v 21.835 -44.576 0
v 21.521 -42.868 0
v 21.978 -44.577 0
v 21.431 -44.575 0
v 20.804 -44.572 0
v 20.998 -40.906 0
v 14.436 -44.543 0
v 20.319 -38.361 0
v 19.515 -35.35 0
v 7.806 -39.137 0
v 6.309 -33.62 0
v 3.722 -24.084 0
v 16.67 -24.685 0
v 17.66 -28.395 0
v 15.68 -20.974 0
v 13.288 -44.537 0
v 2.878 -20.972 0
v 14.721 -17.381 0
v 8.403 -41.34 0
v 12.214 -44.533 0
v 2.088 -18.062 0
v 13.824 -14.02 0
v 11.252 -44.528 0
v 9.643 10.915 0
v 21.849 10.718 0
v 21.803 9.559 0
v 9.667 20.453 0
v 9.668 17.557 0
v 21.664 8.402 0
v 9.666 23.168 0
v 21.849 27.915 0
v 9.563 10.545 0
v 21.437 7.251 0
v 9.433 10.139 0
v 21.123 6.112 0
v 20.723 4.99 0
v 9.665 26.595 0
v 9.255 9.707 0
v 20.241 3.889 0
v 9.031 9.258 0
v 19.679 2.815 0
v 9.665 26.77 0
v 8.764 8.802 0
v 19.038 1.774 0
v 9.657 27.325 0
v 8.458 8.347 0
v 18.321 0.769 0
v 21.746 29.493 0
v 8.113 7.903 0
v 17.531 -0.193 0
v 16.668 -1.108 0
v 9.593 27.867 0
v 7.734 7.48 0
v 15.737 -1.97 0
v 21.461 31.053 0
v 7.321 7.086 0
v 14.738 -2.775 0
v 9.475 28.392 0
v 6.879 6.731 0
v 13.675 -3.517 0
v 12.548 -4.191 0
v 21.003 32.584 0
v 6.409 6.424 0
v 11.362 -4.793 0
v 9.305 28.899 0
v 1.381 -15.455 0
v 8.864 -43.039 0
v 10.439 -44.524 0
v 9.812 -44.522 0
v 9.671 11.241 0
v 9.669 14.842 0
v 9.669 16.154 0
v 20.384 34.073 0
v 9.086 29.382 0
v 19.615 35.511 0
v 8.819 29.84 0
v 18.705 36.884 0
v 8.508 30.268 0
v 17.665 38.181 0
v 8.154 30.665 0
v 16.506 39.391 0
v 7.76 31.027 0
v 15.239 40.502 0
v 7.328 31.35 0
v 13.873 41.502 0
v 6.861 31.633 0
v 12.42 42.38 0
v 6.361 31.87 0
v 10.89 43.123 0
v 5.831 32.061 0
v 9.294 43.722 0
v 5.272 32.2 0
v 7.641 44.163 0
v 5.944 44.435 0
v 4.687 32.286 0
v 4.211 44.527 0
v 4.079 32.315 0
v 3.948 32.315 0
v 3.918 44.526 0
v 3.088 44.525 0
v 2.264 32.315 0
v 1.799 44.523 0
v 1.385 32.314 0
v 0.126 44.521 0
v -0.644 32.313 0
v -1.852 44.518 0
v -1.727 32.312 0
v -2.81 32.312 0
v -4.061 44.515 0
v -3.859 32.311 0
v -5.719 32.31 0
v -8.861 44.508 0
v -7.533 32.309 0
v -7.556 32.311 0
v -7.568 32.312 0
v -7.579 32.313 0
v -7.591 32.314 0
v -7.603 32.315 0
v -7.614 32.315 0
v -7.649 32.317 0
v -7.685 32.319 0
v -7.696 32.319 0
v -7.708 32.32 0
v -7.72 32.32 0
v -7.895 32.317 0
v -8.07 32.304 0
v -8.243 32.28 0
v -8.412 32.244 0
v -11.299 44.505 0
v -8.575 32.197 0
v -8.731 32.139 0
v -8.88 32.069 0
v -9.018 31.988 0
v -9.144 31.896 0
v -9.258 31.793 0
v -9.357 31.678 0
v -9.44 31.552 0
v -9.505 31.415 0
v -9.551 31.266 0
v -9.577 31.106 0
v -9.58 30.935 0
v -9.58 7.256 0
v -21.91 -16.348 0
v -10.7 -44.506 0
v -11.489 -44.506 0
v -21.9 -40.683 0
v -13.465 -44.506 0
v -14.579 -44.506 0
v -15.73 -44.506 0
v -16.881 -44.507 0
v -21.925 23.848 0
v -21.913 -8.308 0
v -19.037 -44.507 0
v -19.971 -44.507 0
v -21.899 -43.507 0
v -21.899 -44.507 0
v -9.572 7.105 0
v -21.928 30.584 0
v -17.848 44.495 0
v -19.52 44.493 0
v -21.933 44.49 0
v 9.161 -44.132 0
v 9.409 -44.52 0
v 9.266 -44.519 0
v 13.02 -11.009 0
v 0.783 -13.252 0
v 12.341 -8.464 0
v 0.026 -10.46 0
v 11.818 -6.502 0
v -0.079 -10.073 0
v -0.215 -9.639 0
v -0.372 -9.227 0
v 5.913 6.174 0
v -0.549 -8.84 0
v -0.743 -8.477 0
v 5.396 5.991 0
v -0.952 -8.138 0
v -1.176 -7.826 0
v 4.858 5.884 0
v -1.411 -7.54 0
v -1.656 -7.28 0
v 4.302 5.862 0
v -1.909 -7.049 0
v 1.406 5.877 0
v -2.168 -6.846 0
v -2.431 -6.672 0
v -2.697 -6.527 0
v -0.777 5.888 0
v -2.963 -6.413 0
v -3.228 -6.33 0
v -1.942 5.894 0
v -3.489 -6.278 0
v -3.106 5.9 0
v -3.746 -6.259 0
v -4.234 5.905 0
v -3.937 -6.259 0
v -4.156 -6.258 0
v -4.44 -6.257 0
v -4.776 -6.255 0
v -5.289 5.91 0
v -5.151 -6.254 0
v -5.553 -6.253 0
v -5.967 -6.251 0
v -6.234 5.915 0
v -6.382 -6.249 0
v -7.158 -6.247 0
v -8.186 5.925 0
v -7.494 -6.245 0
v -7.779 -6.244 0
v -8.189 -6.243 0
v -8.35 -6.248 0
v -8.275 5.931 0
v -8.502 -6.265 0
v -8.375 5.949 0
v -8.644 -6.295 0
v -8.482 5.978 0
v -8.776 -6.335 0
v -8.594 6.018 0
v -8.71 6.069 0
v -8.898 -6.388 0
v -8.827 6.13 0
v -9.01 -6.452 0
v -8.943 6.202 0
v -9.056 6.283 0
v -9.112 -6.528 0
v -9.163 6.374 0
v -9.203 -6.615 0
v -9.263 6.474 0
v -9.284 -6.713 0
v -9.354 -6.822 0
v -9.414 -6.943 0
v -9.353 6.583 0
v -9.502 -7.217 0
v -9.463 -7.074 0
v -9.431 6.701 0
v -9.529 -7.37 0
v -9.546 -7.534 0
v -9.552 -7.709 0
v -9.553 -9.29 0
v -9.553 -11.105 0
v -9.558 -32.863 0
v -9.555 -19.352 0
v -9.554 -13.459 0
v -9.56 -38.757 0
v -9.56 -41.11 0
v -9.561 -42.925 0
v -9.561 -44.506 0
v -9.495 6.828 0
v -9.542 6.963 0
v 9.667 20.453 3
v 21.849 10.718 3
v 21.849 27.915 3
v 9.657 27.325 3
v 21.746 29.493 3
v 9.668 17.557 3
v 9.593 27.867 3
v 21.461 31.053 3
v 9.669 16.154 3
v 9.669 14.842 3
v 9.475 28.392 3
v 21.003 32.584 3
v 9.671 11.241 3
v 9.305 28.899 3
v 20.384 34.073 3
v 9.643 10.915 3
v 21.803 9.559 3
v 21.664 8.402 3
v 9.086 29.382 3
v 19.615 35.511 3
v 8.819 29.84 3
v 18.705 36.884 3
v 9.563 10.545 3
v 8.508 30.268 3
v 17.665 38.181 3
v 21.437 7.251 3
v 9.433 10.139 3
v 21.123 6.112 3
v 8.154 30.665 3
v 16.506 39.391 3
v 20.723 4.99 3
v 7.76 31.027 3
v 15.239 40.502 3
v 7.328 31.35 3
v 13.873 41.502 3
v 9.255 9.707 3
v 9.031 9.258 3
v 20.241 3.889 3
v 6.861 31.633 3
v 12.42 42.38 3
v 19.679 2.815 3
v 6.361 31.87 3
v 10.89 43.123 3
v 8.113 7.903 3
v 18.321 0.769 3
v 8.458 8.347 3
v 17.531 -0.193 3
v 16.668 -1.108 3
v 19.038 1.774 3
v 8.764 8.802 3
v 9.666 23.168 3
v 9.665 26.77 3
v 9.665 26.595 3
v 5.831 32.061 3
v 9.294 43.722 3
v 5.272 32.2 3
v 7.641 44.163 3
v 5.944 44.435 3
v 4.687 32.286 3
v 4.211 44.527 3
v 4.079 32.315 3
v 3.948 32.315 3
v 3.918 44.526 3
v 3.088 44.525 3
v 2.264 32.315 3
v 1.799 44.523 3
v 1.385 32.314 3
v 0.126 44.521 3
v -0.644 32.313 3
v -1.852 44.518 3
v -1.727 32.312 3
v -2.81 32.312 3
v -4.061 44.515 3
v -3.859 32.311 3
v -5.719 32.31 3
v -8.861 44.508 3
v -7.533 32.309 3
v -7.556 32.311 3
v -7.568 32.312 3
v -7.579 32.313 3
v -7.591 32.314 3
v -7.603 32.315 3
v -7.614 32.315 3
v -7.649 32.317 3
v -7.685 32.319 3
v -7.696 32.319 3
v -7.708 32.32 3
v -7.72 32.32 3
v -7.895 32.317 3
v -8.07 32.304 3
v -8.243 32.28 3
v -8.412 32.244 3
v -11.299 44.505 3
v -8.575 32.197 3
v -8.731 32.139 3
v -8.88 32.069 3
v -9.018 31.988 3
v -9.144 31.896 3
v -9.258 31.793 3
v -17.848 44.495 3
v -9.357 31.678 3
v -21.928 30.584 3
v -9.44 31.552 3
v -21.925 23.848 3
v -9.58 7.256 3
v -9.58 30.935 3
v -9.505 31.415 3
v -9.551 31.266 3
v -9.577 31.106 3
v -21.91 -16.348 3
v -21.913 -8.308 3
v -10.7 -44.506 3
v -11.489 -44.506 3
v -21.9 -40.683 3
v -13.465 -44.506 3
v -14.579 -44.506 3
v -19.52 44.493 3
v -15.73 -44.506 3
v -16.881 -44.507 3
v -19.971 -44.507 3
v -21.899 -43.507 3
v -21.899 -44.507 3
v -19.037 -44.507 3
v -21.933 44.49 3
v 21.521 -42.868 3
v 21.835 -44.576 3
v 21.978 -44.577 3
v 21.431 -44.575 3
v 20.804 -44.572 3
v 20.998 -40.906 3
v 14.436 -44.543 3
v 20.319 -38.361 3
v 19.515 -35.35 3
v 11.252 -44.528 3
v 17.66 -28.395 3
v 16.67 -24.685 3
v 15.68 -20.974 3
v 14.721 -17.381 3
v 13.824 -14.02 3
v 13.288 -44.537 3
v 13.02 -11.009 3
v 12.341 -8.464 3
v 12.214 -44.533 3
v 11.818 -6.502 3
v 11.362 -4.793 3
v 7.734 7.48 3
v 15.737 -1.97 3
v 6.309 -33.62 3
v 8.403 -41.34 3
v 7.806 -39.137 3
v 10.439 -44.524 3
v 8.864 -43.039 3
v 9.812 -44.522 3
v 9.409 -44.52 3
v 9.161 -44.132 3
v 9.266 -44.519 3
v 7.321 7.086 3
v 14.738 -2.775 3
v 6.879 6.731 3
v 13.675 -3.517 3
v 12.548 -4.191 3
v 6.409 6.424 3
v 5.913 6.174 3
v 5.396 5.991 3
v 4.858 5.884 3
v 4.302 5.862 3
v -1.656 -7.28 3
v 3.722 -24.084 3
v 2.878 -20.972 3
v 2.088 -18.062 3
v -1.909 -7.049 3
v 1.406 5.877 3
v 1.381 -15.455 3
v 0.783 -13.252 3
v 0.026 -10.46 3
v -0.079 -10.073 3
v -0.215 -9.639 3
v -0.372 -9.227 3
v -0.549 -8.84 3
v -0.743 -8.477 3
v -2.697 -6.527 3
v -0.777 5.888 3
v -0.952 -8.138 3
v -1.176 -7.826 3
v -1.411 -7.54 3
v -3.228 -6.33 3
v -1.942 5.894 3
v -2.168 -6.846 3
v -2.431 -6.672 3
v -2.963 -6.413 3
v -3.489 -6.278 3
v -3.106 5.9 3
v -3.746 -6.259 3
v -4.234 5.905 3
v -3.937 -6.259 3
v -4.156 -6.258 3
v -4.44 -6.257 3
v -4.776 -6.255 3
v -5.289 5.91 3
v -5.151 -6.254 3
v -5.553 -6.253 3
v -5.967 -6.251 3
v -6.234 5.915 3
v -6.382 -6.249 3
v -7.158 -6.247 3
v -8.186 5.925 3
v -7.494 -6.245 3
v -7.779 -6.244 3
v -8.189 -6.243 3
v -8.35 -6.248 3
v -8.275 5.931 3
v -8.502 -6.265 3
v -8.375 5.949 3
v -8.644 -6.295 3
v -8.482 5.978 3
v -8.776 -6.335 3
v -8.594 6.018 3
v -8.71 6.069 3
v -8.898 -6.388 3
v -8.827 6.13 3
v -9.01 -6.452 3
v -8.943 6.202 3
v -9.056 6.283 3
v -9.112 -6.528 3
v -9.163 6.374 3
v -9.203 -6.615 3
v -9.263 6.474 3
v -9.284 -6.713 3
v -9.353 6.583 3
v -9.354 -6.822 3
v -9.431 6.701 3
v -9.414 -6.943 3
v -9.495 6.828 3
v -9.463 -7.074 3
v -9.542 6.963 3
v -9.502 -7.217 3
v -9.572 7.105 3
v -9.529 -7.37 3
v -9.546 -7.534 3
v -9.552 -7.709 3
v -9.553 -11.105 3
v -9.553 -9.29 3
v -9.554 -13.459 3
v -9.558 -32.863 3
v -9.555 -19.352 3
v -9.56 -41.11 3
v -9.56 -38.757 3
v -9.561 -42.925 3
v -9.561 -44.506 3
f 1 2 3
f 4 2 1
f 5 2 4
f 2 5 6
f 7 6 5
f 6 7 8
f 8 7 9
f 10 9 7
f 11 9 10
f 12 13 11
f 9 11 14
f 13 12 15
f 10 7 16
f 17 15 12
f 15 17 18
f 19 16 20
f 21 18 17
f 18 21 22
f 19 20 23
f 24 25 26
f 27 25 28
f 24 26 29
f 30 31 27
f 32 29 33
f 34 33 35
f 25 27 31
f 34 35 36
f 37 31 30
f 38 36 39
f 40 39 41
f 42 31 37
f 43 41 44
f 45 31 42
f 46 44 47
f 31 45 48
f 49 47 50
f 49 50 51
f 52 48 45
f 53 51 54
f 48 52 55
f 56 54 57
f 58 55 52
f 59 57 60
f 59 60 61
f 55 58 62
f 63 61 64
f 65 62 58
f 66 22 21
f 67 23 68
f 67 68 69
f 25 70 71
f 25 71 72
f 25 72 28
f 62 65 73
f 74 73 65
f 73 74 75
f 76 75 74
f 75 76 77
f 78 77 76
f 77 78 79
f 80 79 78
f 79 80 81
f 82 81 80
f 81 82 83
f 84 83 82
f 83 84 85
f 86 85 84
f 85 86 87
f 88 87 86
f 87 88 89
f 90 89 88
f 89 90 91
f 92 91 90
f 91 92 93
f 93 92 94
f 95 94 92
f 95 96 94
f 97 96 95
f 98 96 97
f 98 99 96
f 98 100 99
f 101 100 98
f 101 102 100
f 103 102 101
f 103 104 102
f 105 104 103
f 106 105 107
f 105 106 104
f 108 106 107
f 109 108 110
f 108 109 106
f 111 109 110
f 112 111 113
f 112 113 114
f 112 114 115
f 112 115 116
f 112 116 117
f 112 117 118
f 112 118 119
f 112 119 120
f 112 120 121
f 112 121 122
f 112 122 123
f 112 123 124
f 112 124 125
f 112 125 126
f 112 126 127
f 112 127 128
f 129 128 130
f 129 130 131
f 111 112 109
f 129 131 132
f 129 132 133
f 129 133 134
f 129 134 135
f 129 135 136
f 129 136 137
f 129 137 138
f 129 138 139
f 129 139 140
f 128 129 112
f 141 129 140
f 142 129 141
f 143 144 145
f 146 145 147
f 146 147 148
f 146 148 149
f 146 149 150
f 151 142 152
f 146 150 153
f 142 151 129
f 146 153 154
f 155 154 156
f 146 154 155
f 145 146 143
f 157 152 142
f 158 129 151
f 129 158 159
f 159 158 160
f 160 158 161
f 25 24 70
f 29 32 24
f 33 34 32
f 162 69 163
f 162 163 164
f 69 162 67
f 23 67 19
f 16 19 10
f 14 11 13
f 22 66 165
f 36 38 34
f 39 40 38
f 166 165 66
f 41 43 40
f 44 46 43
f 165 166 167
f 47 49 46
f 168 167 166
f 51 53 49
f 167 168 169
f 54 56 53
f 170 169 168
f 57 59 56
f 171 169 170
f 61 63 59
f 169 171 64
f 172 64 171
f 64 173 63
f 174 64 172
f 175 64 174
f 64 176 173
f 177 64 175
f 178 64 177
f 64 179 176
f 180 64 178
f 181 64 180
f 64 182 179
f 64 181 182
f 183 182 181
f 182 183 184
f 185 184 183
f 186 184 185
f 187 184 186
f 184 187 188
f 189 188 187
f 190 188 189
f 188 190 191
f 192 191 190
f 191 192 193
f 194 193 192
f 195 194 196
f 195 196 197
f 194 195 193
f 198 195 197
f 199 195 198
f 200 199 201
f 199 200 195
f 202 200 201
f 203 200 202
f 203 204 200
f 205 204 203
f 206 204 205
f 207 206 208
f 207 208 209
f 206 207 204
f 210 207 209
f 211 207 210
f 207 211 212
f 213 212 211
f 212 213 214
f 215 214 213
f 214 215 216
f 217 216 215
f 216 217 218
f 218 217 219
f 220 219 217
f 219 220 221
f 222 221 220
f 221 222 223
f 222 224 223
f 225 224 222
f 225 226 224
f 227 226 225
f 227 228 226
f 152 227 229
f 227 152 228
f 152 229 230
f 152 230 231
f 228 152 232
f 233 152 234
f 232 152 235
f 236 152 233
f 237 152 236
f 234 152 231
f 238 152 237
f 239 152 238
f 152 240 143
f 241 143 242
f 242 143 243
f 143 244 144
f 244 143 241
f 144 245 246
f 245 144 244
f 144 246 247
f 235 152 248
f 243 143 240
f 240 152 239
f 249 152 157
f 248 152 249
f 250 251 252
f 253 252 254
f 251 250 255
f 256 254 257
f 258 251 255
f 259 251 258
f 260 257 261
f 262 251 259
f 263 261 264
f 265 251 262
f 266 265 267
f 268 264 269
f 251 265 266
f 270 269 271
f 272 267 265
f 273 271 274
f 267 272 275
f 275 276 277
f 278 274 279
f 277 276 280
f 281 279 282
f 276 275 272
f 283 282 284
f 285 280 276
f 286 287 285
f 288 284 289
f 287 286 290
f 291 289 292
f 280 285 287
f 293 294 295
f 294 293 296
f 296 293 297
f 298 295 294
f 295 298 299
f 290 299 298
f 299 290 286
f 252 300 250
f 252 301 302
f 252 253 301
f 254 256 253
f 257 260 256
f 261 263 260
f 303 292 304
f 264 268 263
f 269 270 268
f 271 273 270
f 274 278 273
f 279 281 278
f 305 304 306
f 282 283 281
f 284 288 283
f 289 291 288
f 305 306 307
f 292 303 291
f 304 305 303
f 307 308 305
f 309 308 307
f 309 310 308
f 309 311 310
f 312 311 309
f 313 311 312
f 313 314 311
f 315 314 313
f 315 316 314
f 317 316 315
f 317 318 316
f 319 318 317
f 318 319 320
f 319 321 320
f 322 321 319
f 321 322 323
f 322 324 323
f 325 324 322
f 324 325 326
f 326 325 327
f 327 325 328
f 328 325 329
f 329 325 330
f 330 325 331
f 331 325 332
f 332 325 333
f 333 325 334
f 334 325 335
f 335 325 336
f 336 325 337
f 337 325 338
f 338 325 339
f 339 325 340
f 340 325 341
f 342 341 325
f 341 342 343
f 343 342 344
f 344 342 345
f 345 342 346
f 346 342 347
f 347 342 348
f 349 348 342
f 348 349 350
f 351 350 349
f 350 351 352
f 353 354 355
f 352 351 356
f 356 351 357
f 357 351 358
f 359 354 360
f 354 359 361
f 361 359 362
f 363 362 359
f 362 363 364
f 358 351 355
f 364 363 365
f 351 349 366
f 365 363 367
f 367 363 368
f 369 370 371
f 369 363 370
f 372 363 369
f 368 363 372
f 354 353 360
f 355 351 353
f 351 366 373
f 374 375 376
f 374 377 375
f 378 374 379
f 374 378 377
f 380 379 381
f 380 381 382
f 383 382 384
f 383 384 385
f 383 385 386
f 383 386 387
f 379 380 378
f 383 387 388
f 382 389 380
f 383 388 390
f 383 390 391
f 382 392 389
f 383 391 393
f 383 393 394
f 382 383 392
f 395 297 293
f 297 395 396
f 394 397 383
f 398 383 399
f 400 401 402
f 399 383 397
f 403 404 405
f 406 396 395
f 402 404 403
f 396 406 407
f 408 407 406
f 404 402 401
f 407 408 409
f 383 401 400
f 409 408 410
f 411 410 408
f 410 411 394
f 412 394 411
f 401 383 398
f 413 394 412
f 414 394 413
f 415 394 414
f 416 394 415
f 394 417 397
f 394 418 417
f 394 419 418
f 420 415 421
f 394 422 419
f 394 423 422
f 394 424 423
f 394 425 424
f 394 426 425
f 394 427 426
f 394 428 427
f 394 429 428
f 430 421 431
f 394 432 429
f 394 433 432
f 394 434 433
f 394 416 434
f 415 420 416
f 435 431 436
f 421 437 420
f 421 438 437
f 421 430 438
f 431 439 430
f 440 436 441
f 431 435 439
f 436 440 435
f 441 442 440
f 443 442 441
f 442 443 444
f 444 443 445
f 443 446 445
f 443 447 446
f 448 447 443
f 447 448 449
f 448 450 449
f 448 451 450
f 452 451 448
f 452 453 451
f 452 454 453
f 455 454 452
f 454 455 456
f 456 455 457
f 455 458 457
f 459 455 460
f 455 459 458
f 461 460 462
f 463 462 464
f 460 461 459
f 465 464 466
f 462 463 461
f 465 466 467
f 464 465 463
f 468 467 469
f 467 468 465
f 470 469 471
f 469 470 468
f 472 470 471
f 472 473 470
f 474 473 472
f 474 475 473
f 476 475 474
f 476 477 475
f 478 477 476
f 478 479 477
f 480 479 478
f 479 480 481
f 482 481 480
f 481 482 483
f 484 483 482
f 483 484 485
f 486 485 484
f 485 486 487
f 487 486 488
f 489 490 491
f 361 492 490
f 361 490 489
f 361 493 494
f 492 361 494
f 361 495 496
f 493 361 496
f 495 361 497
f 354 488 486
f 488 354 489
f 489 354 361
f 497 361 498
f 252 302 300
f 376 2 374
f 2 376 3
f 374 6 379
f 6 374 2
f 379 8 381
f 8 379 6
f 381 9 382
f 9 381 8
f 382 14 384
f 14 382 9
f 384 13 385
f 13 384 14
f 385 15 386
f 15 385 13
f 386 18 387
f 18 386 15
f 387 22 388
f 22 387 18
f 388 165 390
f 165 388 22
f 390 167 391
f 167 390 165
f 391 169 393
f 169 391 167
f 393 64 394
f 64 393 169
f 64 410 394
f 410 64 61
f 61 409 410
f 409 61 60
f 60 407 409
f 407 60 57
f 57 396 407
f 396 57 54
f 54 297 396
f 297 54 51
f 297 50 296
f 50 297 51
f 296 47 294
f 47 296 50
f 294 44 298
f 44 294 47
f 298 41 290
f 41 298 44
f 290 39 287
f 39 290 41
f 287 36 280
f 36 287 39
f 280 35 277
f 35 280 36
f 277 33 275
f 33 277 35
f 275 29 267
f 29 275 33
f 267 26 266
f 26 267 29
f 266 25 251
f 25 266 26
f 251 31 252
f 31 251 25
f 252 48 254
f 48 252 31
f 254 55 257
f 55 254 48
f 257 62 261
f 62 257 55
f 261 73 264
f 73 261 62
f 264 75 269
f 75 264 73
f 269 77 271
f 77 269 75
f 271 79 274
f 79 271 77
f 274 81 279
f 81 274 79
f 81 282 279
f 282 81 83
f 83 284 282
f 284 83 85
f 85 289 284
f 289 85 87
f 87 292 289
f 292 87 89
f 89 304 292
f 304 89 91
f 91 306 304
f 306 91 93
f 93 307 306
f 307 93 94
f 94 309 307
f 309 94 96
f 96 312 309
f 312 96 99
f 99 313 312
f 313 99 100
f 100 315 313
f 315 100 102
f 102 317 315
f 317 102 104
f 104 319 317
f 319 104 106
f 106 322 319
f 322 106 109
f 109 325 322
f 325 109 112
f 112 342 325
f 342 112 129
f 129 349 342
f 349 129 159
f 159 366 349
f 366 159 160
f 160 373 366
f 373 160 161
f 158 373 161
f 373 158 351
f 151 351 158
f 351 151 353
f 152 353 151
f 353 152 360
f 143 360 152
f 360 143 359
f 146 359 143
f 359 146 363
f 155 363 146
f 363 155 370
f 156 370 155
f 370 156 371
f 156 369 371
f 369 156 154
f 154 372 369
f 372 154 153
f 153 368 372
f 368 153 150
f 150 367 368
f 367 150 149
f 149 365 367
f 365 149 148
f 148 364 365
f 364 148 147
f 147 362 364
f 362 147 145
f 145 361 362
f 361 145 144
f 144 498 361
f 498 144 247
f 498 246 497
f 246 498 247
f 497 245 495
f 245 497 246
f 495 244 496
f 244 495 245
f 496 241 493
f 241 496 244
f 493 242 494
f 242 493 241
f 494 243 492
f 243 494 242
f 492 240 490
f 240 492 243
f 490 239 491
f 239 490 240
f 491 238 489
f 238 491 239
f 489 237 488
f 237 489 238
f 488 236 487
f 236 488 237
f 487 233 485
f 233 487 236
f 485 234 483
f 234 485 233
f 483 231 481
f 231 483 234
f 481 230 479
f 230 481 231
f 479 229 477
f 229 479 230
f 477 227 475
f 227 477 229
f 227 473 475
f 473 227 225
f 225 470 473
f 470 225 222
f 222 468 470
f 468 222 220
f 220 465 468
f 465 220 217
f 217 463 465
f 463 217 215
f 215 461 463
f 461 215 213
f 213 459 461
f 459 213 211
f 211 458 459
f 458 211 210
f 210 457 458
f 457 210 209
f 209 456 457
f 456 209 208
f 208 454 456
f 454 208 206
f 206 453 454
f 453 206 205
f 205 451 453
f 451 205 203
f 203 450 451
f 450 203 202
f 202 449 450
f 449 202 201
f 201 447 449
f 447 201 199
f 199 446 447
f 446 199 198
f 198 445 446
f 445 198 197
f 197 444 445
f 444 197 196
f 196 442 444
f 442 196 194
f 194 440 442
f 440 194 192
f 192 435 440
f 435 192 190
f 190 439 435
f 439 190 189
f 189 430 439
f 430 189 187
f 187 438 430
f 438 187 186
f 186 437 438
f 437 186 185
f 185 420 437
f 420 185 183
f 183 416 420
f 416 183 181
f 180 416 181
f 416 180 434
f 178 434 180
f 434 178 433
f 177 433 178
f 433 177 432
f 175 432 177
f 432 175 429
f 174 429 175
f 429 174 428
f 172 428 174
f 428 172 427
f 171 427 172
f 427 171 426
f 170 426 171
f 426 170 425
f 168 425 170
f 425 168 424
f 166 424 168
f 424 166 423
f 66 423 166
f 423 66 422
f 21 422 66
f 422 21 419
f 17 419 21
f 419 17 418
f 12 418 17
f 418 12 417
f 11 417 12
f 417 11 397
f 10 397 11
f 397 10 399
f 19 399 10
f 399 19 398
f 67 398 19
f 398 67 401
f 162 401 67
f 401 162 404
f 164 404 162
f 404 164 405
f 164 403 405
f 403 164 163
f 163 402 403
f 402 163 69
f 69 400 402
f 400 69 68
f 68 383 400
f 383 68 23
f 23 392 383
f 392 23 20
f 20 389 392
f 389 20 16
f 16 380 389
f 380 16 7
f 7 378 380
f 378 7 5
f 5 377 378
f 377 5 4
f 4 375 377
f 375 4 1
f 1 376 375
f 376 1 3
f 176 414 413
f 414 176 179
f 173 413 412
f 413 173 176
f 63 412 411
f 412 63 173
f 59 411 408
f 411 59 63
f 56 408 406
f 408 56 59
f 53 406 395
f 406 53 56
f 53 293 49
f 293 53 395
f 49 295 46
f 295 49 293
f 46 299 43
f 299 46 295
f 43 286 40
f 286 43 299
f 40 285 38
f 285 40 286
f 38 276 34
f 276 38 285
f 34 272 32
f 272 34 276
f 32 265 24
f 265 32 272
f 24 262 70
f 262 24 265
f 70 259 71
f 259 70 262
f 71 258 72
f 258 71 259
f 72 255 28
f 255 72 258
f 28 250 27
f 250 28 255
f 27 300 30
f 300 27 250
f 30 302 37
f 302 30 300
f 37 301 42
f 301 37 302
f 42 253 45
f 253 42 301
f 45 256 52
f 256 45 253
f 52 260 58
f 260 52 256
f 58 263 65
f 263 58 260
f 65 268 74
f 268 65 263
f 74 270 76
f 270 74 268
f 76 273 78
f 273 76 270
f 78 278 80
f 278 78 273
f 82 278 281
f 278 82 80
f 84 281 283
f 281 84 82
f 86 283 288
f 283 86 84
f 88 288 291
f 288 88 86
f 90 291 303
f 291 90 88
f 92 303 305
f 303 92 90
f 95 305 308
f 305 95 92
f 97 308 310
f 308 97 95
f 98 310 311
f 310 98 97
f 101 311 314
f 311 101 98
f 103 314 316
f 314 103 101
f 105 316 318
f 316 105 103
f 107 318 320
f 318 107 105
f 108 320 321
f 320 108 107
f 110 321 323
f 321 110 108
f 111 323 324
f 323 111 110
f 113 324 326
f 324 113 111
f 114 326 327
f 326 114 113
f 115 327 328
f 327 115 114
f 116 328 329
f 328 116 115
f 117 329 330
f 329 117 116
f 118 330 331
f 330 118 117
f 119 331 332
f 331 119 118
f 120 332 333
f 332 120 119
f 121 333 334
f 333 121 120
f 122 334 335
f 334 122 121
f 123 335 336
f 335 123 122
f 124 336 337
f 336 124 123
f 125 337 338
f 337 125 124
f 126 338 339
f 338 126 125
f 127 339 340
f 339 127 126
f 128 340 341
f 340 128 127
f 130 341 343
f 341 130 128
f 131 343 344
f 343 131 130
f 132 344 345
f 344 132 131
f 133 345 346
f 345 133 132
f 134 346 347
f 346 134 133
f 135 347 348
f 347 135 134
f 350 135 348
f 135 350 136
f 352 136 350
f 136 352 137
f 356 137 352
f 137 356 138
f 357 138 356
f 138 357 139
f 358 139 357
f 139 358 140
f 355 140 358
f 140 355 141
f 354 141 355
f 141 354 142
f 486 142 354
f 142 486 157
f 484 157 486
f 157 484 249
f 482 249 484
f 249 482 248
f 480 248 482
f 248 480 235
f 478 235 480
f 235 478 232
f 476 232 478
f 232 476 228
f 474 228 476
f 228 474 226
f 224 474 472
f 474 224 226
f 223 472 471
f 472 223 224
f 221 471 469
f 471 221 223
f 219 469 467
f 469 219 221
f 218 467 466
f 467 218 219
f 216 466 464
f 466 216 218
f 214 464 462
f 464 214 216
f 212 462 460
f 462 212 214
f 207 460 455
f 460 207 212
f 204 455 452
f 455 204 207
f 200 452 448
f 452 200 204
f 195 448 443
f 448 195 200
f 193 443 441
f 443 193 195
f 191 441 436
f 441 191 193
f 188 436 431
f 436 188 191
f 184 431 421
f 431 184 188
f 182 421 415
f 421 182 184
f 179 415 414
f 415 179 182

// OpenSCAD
// Generated from 交通部公路局（原交通部公路總局）「新式號牌使用之英文字、數字字體」author trace
fudge = 0.1;

module glyph_2012_R(h = 3) {
  difference() {
    linear_extrude(height = h)
      polygon(points = [[4.2113, 44.5266], [3.9177, 44.5262], [3.088, 44.525], [1.7986, 44.5232], [0.1263, 44.5208], [-1.8524, 44.5181], [-4.0609, 44.5149], [-6.4225, 44.5116], [-8.8608, 44.5082], [-11.2991, 44.5047], [-13.6607, 44.5014], [-15.8692, 44.4983], [-17.8479, 44.4955], [-19.5202, 44.4931], [-20.8096, 44.4913], [-21.6393, 44.4901], [-21.933, 44.4897], [-21.9326, 43.4902], [-21.9315, 40.6656], [-21.9298, 36.2767], [-21.9276, 30.584], [-21.9251, 23.8484], [-21.9222, 16.3307], [-21.9191, 8.2915], [-21.9159, -0.0085], [-21.9127, -8.3085], [-21.9097, -16.3477], [-21.9068, -23.8655], [-21.9042, -30.601], [-21.902, -36.2937], [-21.9003, -40.6827], [-21.8993, -43.5073], [-21.8989, -44.5067], [-21.7603, -44.5067], [-21.3687, -44.5067], [-20.7603, -44.5067], [-19.9711, -44.5067], [-19.0374, -44.5066], [-17.9952, -44.5066], [-16.8807, -44.5066], [-15.7301, -44.5065], [-14.5794, -44.5065], [-13.465, -44.5064], [-12.4228, -44.5064], [-11.489, -44.5064], [-10.6998, -44.5063], [-10.0914, -44.5063], [-9.6998, -44.5063], [-9.5613, -44.5063], [-9.5612, -44.0931], [-9.5609, -42.9252], [-9.5604, -41.1105], [-9.5599, -38.7567], [-9.5592, -35.9718], [-9.5584, -32.8634], [-9.5576, -29.5395], [-9.5568, -26.1077], [-9.556, -22.6759], [-9.5552, -19.3519], [-9.5544, -16.2436], [-9.5537, -13.4586], [-9.5532, -11.1049], [-9.5527, -9.2902], [-9.5525, -8.1223], [-9.5524, -7.709], [-9.5464, -7.5343], [-9.5295, -7.3702], [-9.5017, -7.2169], [-9.4632, -7.0744], [-9.414, -6.9428], [-9.3542, -6.8223], [-9.2838, -6.7128], [-9.203, -6.6146], [-9.1118, -6.5276], [-9.0102, -6.4521], [-8.8985, -6.388], [-8.7765, -6.3355], [-8.6445, -6.2946], [-8.5025, -6.2655], [-8.3505, -6.2482], [-8.1887, -6.2428], [-8.1388, -6.243], [-7.9978, -6.2435], [-7.7787, -6.2443], [-7.4945, -6.2453], [-7.1582, -6.2466], [-6.7829, -6.248], [-6.3816, -6.2495], [-5.9672, -6.251], [-5.5528, -6.2526], [-5.1515, -6.254], [-4.7762, -6.2554], [-4.4399, -6.2567], [-4.1558, -6.2577], [-3.9366, -6.2586], [-3.7956, -6.2591], [-3.7457, -6.2593], [-3.4894, -6.2784], [-3.2278, -6.3299], [-2.963, -6.413], [-2.6968, -6.5272], [-2.4311, -6.6717], [-2.1677, -6.8458], [-1.9086, -7.049], [-1.6557, -7.2805], [-1.4107, -7.5397], [-1.1757, -7.8259], [-0.9524, -8.1384], [-0.7428, -8.4766], [-0.5488, -8.8398], [-0.3722, -9.2274], [-0.2149, -9.6387], [-0.0788, -10.0729], [0.0261, -10.4598], [0.3227, -11.5531], [0.7835, -13.2518], [1.3813, -15.4552], [2.0885, -18.0622], [2.8779, -20.972], [3.722, -24.0836], [4.5935, -27.2961], [5.465, -30.5086], [6.3091, -33.6202], [7.0985, -36.5299], [7.8058, -39.137], [8.4035, -41.3403], [8.8643, -43.0391], [9.1609, -44.1323], [9.2659, -44.5192], [9.4086, -44.5198], [9.8121, -44.5217], [10.439, -44.5245], [11.2521, -44.5283], [12.2141, -44.5326], [13.2879, -44.5375], [14.4362, -44.5428], [15.6217, -44.5482], [16.8073, -44.5536], [17.9555, -44.5588], [19.0293, -44.5637], [19.9914, -44.5681], [20.8045, -44.5718], [21.4314, -44.5747], [21.8349, -44.5765], [21.9776, -44.5772], [21.8584, -44.1304], [21.5215, -42.8677], [20.9979, -40.9057], [20.3189, -38.3608], [19.5154, -35.3498], [18.6187, -31.9891], [17.6598, -28.3953], [16.6697, -24.6849], [15.6797, -20.9745], [14.7207, -17.3807], [13.824, -14.02], [13.0205, -11.009], [12.3415, -8.4641], [11.8179, -6.5021], [11.481, -5.2394], [11.3618, -4.7926], [12.5485, -4.1913], [13.6748, -3.517], [14.7383, -2.7749], [15.7369, -1.9702], [16.6684, -1.1078], [17.5306, -0.1929], [18.3211, 0.7693], [19.0379, 1.7738], [19.6786, 2.8154], [20.2412, 3.8891], [20.7232, 4.9897], [21.1226, 6.1122], [21.4371, 7.2513], [21.6645, 8.4021], [21.8026, 9.5593], [21.8491, 10.718], [21.8491, 10.9111], [21.8491, 11.4569], [21.8491, 12.3051], [21.8491, 13.4051], [21.8491, 14.7067], [21.8491, 16.1594], [21.8491, 17.7129], [21.8491, 19.3168], [21.8491, 20.9206], [21.8491, 22.4741], [21.8491, 23.9268], [21.8491, 25.2284], [21.8491, 26.3284], [21.8491, 27.1766], [21.8491, 27.7224], [21.8491, 27.9155], [21.7462, 29.4931], [21.4607, 31.0531], [21.0033, 32.5837], [20.3845, 34.0735], [19.6149, 35.5108], [18.7049, 36.8839], [17.6652, 38.1812], [16.5064, 39.391], [15.2389, 40.5018], [13.8733, 41.5019], [12.4202, 42.3797], [10.8902, 43.1235], [9.2937, 43.7218], [7.6414, 44.1628], [5.9437, 44.4349], [4.2113, 44.5266], [4.2113, 44.5266], [4.2113, 44.5266], [4.2113, 44.5266], [4.2113, 44.5266], [4.2113, 44.5266], [4.2113, 44.5266], [4.2113, 44.5266], [4.2113, 44.5266], [4.2113, 44.5266], [4.2113, 44.5266], [4.2113, 44.5266], [4.2113, 44.5266], [4.2113, 44.5266], [4.2113, 44.5266], [4.2113, 44.5266]]);
    translate([0, 0, -fudge])
      linear_extrude(height = h + 2 * fudge)
        polygon(points = [[-7.7198, 32.3199], [-7.7081, 32.3196], [-7.6964, 32.3191], [-7.6847, 32.3187], [-7.673, 32.3182], [-7.6612, 32.3177], [-7.6495, 32.3172], [-7.6378, 32.3166], [-7.6261, 32.316], [-7.6144, 32.3154], [-7.6027, 32.3147], [-7.5911, 32.3139], [-7.5794, 32.3132], [-7.5678, 32.3123], [-7.5561, 32.3115], [-7.5445, 32.3105], [-7.5329, 32.3095], [-7.4025, 32.3096], [-7.034, 32.3098], [-6.4613, 32.3101], [-5.7186, 32.3105], [-4.8398, 32.3109], [-3.8589, 32.3114], [-2.8101, 32.312], [-1.7272, 32.3125], [-0.6442, 32.3131], [0.4046, 32.3136], [1.3855, 32.3141], [2.2643, 32.3146], [3.007, 32.315], [3.5797, 32.3153], [3.9482, 32.3155], [4.0786, 32.3155], [4.687, 32.2865], [5.2719, 32.2005], [5.8308, 32.0608], [6.3614, 31.8705], [6.8614, 31.6327], [7.3283, 31.3505], [7.7599, 31.0269], [8.1538, 30.6652], [8.5076, 30.2684], [8.819, 29.8396], [9.0856, 29.382], [9.3051, 28.8986], [9.4751, 28.3925], [9.5932, 27.867], [9.6572, 27.325], [9.6646, 26.7697], [9.6646, 26.5953], [9.6648, 26.1024], [9.6651, 25.3366], [9.6655, 24.3433], [9.666, 23.168], [9.6665, 21.8562], [9.667, 20.4534], [9.6676, 19.0052], [9.6682, 17.5569], [9.6687, 16.1541], [9.6692, 14.8423], [9.6697, 13.6671], [9.6701, 12.6737], [9.6704, 11.9079], [9.6706, 11.415], [9.6707, 11.2406], [9.6435, 10.9151], [9.5634, 10.5448], [9.4329, 10.1391], [9.2546, 9.7071], [9.0309, 9.2583], [8.7644, 8.8019], [8.4577, 8.3472], [8.1132, 7.9035], [7.7336, 7.48], [7.3212, 7.086], [6.8787, 6.7309], [6.4086, 6.4238], [5.9134, 6.1742], [5.3956, 5.9912], [4.8578, 5.8842], [4.3025, 5.8624], [4.1622, 5.8631], [3.7659, 5.8651], [3.15, 5.8682], [2.3512, 5.8722], [1.406, 5.8769], [0.3511, 5.8822], [-0.777, 5.8879], [-1.9416, 5.8937], [-3.1063, 5.8996], [-4.2344, 5.9052], [-5.2893, 5.9105], [-6.2345, 5.9152], [-7.0333, 5.9192], [-7.6491, 5.9223], [-8.0455, 5.9243], [-8.1857, 5.925], [-8.2753, 5.9313], [-8.3747, 5.9491], [-8.4818, 5.9782], [-8.5944, 6.0182], [-8.7102, 6.069], [-8.8272, 6.1303], [-8.9431, 6.2017], [-9.0558, 6.283], [-9.1631, 6.3739], [-9.2629, 6.4741], [-9.3528, 6.5834], [-9.4309, 6.7014], [-9.4948, 6.828], [-9.5425, 6.9627], [-9.5717, 7.1054], [-9.5802, 7.2557], [-9.5802, 7.5217], [-9.5802, 8.2732], [-9.5802, 9.441], [-9.5802, 10.9556], [-9.5802, 12.7477], [-9.5802, 14.7479], [-9.5802, 16.8869], [-9.5802, 19.0952], [-9.5802, 21.3036], [-9.5802, 23.4425], [-9.5802, 25.4428], [-9.5802, 27.2349], [-9.5802, 28.7495], [-9.5802, 29.9173], [-9.5802, 30.6688], [-9.5802, 30.9347], [-9.5769, 31.106], [-9.5514, 31.266], [-9.5052, 31.4146], [-9.4398, 31.5519], [-9.3569, 31.6779], [-9.2579, 31.7926], [-9.1443, 31.896], [-9.0177, 31.9882], [-8.8796, 32.069], [-8.7315, 32.1386], [-8.575, 32.1969], [-8.4116, 32.2439], [-8.2429, 32.2797], [-8.0703, 32.3042], [-7.8954, 32.3175], [-7.7197, 32.3196], [-7.7197, 32.3196], [-7.7197, 32.3196], [-7.7197, 32.3196], [-7.7197, 32.3196], [-7.7197, 32.3197], [-7.7197, 32.3197], [-7.7197, 32.3197], [-7.7197, 32.3198], [-7.7198, 32.3198], [-7.7198, 32.3198], [-7.7198, 32.3199], [-7.7198, 32.3199], [-7.7198, 32.3199], [-7.7198, 32.3199], [-7.7198, 32.3199]]);
  }
}

glyph_2012_R();
